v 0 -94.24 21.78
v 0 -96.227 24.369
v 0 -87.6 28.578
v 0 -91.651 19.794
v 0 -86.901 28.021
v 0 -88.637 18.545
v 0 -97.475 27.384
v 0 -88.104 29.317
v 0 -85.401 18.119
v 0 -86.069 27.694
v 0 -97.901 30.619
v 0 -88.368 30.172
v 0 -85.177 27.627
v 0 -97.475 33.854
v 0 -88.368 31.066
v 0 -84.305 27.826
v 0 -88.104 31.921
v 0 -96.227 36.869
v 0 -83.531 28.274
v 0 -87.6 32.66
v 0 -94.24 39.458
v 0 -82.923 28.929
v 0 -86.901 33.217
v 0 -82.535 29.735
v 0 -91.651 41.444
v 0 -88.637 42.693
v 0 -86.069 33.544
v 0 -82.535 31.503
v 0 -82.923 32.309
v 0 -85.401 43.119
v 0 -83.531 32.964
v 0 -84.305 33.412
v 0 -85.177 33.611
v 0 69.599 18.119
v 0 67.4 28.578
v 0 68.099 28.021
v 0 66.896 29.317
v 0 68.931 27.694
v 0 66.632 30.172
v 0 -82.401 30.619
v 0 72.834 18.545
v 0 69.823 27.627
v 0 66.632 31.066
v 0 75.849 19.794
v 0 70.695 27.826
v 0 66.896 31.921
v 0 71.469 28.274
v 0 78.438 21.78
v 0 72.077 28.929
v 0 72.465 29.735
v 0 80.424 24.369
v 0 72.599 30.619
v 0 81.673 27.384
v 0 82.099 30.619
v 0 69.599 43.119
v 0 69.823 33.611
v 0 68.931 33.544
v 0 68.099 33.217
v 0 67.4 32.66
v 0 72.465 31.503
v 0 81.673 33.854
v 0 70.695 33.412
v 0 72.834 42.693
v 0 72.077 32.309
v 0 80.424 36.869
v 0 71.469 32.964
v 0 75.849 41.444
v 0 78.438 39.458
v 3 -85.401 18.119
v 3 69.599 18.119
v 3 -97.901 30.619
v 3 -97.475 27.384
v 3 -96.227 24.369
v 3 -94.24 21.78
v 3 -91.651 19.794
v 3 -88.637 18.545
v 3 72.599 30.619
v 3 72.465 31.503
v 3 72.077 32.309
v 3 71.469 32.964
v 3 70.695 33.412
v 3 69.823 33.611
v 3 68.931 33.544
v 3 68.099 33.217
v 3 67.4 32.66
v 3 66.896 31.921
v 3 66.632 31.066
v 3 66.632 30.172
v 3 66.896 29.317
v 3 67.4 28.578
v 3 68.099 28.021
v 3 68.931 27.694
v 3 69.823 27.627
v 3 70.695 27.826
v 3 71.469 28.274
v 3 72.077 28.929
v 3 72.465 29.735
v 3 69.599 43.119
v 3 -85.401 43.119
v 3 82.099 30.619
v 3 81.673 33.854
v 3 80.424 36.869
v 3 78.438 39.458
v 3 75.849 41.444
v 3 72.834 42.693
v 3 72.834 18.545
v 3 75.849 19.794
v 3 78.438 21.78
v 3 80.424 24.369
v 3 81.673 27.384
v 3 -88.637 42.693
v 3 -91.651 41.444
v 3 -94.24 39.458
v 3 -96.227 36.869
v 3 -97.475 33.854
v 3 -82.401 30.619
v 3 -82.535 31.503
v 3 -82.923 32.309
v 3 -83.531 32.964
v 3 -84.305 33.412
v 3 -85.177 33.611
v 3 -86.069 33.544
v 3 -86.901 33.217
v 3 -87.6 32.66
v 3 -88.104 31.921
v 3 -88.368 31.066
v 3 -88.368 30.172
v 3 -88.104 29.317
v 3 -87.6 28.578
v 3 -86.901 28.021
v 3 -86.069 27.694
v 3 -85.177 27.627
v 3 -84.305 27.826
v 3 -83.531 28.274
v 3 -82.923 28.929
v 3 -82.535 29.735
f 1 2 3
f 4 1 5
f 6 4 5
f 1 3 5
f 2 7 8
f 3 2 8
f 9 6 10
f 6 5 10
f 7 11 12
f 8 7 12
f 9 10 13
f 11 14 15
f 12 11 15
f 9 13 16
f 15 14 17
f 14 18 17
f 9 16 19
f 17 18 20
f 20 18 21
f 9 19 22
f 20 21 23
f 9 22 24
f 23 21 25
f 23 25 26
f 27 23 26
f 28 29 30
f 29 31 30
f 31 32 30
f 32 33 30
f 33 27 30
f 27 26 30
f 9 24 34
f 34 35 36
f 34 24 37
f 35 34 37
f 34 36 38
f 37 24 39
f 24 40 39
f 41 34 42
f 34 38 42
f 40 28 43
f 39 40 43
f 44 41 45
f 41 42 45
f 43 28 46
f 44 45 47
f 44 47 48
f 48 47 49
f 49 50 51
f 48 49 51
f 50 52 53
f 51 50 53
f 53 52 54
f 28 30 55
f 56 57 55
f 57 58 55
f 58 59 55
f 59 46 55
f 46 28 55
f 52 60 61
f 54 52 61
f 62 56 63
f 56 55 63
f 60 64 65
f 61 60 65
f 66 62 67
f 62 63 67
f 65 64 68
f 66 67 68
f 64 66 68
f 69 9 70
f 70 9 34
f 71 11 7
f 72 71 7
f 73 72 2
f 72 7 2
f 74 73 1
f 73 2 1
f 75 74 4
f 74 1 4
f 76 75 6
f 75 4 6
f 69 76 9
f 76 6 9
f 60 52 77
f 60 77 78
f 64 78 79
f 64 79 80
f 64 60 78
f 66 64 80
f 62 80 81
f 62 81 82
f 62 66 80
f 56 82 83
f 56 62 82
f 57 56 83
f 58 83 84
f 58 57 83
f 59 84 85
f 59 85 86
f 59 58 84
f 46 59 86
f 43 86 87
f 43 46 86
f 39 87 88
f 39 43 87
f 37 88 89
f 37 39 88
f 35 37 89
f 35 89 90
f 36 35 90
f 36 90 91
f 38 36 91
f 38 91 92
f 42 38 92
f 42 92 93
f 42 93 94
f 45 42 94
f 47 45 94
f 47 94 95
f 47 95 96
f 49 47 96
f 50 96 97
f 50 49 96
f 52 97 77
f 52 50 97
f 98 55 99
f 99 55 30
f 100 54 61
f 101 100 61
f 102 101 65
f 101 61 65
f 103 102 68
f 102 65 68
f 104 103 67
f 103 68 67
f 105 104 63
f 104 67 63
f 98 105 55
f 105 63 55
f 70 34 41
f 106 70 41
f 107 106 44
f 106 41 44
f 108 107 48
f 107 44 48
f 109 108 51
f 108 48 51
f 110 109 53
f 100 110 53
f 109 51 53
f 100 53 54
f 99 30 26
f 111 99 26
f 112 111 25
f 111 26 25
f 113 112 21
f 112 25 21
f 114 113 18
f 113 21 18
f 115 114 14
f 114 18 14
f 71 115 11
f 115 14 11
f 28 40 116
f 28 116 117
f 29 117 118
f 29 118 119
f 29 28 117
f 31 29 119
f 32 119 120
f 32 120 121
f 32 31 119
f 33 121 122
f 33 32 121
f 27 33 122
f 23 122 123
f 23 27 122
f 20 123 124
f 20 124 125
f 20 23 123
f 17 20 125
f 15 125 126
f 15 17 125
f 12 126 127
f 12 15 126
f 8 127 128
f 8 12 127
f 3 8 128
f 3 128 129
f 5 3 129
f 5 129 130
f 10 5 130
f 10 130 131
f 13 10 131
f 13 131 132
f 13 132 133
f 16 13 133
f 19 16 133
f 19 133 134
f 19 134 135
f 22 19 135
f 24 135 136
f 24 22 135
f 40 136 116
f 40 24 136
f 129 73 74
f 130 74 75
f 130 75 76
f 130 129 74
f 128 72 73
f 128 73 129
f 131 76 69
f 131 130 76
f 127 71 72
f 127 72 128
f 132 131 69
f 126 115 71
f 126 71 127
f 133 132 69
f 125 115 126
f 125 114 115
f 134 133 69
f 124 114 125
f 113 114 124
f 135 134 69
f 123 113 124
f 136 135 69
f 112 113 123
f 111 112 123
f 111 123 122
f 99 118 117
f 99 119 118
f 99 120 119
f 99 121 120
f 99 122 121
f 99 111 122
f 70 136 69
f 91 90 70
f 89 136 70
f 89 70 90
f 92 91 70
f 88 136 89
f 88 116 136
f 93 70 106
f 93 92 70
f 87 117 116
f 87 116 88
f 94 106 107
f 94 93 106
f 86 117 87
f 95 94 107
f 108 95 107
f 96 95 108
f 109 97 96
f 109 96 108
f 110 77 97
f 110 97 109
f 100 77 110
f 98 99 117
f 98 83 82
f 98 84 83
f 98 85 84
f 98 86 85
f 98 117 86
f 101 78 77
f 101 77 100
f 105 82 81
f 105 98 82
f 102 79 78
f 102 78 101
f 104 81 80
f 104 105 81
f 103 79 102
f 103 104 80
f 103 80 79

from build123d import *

# Parameters (mm, degrees)
F0_R     = 3
F1_DEPTH = 3


with BuildPart() as f1:
    # F0 (on Right) → F1 (new body)
    with BuildSketch(Plane.YZ):
        with BuildLine():
            Line((69.598682, 43.118995), (-85.401318, 43.118995))
            ThreePointArc((-85.401318, 43.118995), (-94.240152, 39.45783), (-97.901318, 30.618995))
            ThreePointArc((-97.901318, 30.618995), (-94.240152, 21.78016), (-85.401318, 18.118995))
            Line((-85.401318, 18.118995), (69.598682, 18.118995))
            ThreePointArc((69.598682, 18.118995), (78.437517, 21.78016), (82.098682, 30.618995))
            ThreePointArc((82.098682, 30.618995), (78.437517, 39.45783), (69.598682, 43.118995))
        make_face()
        with Locations((-85.401318, 30.618995)):
            Circle(F0_R, mode=Mode.SUBTRACT)
        with Locations((69.598682, 30.618995)):
            Circle(F0_R, mode=Mode.SUBTRACT)
    extrude(amount=F1_DEPTH)


solid = f1.part
